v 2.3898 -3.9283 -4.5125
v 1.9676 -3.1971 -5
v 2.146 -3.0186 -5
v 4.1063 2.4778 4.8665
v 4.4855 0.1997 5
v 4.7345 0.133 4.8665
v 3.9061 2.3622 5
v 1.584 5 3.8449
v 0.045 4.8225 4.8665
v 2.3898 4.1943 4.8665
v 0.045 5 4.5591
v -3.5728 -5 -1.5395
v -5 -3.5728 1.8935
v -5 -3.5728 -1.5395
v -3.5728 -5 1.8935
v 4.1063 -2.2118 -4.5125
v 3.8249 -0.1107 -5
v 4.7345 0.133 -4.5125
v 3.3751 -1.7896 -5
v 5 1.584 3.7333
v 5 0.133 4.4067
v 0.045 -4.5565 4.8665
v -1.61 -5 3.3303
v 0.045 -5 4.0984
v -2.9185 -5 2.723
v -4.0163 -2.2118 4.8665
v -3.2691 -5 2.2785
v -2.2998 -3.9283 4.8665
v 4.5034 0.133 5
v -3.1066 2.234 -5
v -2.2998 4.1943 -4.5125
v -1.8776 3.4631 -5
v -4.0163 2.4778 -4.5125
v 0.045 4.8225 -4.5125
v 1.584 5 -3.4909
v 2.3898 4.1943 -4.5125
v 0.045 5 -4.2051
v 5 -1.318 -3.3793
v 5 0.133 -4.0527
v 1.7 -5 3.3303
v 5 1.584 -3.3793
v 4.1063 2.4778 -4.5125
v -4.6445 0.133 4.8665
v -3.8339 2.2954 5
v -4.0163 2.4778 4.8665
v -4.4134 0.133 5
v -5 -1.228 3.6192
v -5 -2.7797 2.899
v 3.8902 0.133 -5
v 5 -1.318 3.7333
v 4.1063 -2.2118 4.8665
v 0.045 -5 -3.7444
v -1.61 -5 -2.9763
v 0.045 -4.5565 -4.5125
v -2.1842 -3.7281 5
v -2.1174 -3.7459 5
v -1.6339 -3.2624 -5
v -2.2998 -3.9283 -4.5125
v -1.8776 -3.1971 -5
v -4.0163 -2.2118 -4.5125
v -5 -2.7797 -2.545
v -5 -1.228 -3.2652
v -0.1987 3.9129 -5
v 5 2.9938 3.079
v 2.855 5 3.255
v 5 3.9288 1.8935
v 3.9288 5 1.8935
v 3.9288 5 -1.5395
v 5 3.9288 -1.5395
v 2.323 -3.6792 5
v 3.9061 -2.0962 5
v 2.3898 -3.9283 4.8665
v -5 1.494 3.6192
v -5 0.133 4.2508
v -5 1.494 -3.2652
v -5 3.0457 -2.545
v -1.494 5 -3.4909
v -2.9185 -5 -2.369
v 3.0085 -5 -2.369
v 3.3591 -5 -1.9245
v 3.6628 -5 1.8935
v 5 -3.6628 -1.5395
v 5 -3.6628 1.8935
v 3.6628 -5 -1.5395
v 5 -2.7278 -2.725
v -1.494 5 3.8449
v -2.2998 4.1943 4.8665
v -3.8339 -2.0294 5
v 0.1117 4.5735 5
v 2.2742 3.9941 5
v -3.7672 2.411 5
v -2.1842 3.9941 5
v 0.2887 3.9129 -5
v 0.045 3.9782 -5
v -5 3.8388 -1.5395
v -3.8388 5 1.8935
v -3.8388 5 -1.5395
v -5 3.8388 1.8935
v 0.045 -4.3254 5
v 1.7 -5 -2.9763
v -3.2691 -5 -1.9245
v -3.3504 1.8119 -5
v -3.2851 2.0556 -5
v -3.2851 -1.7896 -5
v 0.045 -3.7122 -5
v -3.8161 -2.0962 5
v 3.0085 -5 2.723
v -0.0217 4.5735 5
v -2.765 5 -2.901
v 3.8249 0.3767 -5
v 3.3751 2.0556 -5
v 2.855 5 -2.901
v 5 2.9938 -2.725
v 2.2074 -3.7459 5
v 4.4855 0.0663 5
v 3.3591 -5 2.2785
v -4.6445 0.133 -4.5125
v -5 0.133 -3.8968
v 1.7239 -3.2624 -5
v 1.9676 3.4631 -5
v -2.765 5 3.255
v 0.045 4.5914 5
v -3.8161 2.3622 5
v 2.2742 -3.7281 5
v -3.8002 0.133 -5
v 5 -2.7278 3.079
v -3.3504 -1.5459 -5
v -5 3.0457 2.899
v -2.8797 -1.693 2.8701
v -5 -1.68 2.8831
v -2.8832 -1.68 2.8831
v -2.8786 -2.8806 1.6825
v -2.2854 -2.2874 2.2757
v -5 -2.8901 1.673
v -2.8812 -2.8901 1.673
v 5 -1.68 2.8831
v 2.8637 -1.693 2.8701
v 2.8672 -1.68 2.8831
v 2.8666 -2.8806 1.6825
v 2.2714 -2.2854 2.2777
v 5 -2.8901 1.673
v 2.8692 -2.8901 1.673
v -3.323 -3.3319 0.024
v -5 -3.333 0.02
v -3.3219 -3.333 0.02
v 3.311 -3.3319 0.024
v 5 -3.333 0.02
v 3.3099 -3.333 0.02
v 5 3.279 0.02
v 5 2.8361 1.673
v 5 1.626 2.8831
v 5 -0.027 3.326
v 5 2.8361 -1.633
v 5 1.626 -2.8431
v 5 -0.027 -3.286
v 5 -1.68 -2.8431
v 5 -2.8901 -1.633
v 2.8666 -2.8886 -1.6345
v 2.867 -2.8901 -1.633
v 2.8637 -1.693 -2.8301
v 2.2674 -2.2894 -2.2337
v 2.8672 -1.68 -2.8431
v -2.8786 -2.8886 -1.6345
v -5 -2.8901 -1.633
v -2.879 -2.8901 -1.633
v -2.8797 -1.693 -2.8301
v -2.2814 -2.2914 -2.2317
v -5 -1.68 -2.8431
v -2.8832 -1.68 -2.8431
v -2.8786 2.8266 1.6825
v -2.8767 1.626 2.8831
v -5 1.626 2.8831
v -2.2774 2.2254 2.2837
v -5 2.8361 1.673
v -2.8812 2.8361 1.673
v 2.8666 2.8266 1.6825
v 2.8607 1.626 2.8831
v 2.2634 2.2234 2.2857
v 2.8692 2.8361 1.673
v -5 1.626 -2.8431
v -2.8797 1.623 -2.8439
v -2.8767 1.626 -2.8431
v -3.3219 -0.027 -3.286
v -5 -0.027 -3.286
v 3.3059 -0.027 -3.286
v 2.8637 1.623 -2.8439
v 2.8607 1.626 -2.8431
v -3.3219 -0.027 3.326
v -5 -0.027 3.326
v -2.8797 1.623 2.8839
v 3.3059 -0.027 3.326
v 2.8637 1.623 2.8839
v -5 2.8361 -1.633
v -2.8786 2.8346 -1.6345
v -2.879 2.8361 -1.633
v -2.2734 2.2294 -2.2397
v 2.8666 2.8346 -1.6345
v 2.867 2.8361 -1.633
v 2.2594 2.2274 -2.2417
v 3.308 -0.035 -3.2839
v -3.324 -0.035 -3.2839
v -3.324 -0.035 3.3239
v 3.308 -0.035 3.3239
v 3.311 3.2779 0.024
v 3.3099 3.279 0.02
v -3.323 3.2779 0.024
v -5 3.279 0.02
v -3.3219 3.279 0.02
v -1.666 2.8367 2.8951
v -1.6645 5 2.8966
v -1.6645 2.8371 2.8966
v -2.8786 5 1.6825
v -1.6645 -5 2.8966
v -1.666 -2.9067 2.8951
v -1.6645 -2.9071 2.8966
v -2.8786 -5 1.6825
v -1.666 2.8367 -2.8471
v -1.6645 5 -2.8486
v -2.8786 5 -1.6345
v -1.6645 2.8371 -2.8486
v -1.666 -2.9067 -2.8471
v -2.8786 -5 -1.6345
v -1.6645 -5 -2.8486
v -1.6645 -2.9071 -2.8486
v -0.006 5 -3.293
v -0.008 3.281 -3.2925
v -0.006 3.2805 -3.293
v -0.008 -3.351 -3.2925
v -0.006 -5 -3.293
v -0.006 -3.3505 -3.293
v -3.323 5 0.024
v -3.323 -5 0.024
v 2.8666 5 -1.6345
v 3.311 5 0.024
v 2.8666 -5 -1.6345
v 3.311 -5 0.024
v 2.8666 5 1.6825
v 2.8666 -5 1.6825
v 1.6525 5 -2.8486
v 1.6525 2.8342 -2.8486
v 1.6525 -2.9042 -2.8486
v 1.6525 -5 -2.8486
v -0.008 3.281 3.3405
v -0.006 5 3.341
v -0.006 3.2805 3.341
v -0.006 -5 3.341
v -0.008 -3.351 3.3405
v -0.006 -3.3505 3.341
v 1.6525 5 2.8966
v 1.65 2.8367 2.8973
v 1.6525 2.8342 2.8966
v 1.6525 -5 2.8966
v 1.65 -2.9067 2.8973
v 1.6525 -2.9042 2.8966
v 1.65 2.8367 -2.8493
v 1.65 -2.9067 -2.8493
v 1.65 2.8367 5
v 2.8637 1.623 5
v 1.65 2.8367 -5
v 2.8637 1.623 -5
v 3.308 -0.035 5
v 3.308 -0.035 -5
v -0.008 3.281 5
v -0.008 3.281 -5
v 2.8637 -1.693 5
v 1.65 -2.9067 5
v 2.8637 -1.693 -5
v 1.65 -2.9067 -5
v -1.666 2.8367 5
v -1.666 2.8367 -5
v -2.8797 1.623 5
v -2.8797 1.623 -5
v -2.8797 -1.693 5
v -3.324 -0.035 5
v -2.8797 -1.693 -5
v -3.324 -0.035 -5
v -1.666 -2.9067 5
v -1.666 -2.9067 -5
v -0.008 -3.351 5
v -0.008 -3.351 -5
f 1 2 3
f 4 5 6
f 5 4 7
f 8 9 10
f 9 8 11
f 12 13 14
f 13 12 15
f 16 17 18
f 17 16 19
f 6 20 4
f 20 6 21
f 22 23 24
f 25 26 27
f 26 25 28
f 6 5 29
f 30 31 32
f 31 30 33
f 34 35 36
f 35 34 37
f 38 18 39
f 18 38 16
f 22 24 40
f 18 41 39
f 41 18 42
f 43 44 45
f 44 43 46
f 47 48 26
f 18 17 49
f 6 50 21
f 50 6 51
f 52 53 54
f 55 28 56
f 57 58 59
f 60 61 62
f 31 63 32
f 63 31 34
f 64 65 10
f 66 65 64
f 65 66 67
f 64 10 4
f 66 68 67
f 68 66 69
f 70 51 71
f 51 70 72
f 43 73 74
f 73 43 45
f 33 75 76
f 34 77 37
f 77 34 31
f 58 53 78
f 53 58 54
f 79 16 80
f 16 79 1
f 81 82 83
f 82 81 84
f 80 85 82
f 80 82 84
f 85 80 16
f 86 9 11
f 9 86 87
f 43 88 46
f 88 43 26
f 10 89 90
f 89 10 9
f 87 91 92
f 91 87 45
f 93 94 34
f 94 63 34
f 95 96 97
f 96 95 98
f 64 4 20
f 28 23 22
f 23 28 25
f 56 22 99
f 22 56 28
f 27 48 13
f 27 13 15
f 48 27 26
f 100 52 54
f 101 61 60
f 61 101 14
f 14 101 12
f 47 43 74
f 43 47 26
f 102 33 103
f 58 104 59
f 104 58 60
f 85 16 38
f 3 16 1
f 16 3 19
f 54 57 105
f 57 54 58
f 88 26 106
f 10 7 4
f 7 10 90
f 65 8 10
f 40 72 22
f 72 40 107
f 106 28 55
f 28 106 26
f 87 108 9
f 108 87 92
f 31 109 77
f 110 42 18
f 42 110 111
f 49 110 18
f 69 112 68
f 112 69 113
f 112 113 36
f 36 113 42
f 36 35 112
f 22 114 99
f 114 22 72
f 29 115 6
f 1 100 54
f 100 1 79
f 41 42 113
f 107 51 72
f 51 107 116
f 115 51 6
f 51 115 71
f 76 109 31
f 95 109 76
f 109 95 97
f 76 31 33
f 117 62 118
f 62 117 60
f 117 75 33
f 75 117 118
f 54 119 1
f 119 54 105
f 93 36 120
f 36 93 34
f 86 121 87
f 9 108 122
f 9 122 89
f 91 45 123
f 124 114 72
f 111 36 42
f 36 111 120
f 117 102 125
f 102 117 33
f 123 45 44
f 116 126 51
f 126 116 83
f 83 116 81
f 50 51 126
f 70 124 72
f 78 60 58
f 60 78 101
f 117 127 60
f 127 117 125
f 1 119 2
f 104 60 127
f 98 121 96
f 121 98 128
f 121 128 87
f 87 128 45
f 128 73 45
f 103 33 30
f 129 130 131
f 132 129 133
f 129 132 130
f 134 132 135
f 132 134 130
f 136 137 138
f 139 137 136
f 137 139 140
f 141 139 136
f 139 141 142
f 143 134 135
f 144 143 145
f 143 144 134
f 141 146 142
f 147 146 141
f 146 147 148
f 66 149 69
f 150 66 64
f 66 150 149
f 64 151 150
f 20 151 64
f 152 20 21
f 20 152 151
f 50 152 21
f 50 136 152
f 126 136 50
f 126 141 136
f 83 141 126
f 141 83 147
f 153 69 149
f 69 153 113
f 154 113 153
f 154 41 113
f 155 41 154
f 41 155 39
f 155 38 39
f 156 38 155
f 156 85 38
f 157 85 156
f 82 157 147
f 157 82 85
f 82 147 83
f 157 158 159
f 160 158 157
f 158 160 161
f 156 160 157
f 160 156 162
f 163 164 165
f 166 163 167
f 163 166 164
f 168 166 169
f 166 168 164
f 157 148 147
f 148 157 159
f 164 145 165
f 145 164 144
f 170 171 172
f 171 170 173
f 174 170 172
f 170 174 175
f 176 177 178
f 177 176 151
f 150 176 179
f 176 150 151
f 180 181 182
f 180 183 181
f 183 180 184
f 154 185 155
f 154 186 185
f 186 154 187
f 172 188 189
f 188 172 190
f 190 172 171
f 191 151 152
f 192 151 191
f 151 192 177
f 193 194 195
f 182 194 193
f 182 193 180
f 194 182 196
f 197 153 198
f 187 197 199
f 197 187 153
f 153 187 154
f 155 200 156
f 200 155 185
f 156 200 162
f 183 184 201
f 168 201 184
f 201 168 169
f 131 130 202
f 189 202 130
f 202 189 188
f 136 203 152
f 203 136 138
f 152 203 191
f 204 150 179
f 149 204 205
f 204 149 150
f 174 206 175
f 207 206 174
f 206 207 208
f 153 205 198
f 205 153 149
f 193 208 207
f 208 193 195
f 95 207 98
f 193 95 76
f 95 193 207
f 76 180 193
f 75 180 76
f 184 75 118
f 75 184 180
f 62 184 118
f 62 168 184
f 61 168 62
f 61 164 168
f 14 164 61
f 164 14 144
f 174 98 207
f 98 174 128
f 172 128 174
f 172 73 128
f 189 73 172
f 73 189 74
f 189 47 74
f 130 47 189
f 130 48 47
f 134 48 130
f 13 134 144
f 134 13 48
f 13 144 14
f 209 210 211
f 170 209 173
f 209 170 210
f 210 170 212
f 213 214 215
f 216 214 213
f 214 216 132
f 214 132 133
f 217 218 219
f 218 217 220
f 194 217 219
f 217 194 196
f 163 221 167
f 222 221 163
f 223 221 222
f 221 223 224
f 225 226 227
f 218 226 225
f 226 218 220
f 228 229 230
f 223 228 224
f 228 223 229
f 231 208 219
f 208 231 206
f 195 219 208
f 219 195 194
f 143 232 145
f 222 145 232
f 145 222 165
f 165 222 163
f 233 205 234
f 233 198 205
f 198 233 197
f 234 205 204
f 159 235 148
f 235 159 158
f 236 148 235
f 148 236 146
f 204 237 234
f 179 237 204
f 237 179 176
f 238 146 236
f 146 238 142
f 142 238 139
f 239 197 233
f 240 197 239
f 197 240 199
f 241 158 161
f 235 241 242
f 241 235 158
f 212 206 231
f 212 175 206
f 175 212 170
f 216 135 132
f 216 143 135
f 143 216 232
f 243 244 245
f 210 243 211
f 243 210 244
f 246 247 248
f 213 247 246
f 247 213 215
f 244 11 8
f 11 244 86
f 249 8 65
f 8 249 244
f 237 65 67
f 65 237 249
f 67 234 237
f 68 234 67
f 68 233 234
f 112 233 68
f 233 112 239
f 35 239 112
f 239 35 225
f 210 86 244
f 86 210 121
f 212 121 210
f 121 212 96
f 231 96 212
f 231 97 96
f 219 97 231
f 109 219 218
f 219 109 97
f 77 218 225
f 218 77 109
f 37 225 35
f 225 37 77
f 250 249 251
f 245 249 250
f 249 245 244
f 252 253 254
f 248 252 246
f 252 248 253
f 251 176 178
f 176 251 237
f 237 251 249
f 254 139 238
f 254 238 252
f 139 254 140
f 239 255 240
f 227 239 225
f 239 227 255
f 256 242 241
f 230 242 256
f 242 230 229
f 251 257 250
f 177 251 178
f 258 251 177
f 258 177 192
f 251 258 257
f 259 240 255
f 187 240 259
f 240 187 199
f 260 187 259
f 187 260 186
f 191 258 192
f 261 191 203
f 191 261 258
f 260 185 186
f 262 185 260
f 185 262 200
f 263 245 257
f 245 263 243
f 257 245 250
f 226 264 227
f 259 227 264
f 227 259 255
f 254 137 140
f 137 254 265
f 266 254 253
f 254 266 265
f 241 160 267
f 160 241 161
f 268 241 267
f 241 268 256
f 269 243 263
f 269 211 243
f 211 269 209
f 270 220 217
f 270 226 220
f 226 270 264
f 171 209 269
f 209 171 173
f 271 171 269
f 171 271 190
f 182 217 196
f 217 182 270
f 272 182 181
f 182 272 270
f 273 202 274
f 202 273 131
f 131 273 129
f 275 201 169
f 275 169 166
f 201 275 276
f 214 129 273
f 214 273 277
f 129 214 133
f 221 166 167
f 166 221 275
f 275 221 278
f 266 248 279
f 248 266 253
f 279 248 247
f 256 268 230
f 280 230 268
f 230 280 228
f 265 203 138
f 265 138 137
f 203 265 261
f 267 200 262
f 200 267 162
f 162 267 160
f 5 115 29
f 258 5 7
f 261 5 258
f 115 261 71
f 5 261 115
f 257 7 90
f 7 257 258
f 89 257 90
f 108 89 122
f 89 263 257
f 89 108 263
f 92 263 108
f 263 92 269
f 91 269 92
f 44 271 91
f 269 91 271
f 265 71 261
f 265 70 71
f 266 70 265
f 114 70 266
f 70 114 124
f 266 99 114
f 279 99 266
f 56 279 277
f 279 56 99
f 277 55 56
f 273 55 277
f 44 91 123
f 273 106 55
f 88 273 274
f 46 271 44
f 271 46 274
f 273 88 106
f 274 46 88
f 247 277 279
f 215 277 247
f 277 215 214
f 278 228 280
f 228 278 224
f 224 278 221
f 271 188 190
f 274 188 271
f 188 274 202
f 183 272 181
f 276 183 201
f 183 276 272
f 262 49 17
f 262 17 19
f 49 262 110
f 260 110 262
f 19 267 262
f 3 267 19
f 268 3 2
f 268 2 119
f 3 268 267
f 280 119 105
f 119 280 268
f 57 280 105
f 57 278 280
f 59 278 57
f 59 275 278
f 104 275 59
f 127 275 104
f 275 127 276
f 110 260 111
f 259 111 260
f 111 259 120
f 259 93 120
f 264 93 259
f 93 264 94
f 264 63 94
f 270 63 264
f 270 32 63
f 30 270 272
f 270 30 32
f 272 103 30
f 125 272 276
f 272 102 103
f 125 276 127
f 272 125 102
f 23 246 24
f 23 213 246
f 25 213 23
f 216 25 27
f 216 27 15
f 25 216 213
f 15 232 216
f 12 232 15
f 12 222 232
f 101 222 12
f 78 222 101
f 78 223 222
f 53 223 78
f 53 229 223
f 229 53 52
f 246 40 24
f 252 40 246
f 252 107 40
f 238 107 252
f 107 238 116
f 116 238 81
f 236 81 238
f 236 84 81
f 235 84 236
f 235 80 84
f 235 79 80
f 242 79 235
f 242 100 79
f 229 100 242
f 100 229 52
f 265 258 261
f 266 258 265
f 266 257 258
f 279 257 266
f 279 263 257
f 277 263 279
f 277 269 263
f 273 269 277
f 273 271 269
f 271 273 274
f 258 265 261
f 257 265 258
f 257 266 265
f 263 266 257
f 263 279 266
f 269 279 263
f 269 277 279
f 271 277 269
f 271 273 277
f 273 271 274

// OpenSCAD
intersection() {
translate([-6, -6, -6]) cube(size = [12, 12, 12], center = false);
union() {
intersection() {
translate([-18.5, -5, -5]) cube(size = [23.5, 10, 10], center = false);
union() {
translate([0, 0, 0]) sphere(r = 55.5, $fn = 12);
translate([0.045, 0.133, 0.177]) sphere(r = 6.632, $fn = 12);
}
difference() {
union() {
translate([0.045, 0.133, 0.177]) sphere(r = 6.632, $fn = 12);
rotate([180, 90, -90])
translate([-0.024, 0.006, -5])
cylinder(h = 23.5, r1 = 3.317, r2 = 3.317, center = false, $fn = 12);
}
union() {
rotate([180, 90, 180])
translate([-0.02, -0.027, -5])
cylinder(h = 10, r1 = 3.306, r2 = 3.306, center = false, $fn = 12);
rotate([180, 90, -90])
translate([-0.024, 0.006, -18.5])
cylinder(h = 23.5, r1 = 3.317, r2 = 3.317, center = false, $fn = 12);
}
}
difference() {
translate([0.045, 0.133, 0.177]) sphere(r = 6.632, $fn = 12);
intersection() {
translate([0, 0, 0]) sphere(r = 55.5, $fn = 12);
translate([-0.008, -0.035, -18.5])
cylinder(h = 23.5, r1 = 3.316, r2 = 3.316, center = false, $fn = 12);
}
}
translate([-5, -5, -18.5]) cube(size = [23.5, 10, 37], center = false);
}
intersection() {
union() {
translate([-0.008, -0.035, 5])
cylinder(h = 13.5, r1 = 3.316, r2 = 3.316, center = false, $fn = 12);
translate([-18.5, -18.5, 5]) cube(size = [37, 13.5, 13.5], center = false);
}
translate([-18.5, -5, -18.5]) cube(size = [37, 23.5, 23.5], center = false);
}
}
}
